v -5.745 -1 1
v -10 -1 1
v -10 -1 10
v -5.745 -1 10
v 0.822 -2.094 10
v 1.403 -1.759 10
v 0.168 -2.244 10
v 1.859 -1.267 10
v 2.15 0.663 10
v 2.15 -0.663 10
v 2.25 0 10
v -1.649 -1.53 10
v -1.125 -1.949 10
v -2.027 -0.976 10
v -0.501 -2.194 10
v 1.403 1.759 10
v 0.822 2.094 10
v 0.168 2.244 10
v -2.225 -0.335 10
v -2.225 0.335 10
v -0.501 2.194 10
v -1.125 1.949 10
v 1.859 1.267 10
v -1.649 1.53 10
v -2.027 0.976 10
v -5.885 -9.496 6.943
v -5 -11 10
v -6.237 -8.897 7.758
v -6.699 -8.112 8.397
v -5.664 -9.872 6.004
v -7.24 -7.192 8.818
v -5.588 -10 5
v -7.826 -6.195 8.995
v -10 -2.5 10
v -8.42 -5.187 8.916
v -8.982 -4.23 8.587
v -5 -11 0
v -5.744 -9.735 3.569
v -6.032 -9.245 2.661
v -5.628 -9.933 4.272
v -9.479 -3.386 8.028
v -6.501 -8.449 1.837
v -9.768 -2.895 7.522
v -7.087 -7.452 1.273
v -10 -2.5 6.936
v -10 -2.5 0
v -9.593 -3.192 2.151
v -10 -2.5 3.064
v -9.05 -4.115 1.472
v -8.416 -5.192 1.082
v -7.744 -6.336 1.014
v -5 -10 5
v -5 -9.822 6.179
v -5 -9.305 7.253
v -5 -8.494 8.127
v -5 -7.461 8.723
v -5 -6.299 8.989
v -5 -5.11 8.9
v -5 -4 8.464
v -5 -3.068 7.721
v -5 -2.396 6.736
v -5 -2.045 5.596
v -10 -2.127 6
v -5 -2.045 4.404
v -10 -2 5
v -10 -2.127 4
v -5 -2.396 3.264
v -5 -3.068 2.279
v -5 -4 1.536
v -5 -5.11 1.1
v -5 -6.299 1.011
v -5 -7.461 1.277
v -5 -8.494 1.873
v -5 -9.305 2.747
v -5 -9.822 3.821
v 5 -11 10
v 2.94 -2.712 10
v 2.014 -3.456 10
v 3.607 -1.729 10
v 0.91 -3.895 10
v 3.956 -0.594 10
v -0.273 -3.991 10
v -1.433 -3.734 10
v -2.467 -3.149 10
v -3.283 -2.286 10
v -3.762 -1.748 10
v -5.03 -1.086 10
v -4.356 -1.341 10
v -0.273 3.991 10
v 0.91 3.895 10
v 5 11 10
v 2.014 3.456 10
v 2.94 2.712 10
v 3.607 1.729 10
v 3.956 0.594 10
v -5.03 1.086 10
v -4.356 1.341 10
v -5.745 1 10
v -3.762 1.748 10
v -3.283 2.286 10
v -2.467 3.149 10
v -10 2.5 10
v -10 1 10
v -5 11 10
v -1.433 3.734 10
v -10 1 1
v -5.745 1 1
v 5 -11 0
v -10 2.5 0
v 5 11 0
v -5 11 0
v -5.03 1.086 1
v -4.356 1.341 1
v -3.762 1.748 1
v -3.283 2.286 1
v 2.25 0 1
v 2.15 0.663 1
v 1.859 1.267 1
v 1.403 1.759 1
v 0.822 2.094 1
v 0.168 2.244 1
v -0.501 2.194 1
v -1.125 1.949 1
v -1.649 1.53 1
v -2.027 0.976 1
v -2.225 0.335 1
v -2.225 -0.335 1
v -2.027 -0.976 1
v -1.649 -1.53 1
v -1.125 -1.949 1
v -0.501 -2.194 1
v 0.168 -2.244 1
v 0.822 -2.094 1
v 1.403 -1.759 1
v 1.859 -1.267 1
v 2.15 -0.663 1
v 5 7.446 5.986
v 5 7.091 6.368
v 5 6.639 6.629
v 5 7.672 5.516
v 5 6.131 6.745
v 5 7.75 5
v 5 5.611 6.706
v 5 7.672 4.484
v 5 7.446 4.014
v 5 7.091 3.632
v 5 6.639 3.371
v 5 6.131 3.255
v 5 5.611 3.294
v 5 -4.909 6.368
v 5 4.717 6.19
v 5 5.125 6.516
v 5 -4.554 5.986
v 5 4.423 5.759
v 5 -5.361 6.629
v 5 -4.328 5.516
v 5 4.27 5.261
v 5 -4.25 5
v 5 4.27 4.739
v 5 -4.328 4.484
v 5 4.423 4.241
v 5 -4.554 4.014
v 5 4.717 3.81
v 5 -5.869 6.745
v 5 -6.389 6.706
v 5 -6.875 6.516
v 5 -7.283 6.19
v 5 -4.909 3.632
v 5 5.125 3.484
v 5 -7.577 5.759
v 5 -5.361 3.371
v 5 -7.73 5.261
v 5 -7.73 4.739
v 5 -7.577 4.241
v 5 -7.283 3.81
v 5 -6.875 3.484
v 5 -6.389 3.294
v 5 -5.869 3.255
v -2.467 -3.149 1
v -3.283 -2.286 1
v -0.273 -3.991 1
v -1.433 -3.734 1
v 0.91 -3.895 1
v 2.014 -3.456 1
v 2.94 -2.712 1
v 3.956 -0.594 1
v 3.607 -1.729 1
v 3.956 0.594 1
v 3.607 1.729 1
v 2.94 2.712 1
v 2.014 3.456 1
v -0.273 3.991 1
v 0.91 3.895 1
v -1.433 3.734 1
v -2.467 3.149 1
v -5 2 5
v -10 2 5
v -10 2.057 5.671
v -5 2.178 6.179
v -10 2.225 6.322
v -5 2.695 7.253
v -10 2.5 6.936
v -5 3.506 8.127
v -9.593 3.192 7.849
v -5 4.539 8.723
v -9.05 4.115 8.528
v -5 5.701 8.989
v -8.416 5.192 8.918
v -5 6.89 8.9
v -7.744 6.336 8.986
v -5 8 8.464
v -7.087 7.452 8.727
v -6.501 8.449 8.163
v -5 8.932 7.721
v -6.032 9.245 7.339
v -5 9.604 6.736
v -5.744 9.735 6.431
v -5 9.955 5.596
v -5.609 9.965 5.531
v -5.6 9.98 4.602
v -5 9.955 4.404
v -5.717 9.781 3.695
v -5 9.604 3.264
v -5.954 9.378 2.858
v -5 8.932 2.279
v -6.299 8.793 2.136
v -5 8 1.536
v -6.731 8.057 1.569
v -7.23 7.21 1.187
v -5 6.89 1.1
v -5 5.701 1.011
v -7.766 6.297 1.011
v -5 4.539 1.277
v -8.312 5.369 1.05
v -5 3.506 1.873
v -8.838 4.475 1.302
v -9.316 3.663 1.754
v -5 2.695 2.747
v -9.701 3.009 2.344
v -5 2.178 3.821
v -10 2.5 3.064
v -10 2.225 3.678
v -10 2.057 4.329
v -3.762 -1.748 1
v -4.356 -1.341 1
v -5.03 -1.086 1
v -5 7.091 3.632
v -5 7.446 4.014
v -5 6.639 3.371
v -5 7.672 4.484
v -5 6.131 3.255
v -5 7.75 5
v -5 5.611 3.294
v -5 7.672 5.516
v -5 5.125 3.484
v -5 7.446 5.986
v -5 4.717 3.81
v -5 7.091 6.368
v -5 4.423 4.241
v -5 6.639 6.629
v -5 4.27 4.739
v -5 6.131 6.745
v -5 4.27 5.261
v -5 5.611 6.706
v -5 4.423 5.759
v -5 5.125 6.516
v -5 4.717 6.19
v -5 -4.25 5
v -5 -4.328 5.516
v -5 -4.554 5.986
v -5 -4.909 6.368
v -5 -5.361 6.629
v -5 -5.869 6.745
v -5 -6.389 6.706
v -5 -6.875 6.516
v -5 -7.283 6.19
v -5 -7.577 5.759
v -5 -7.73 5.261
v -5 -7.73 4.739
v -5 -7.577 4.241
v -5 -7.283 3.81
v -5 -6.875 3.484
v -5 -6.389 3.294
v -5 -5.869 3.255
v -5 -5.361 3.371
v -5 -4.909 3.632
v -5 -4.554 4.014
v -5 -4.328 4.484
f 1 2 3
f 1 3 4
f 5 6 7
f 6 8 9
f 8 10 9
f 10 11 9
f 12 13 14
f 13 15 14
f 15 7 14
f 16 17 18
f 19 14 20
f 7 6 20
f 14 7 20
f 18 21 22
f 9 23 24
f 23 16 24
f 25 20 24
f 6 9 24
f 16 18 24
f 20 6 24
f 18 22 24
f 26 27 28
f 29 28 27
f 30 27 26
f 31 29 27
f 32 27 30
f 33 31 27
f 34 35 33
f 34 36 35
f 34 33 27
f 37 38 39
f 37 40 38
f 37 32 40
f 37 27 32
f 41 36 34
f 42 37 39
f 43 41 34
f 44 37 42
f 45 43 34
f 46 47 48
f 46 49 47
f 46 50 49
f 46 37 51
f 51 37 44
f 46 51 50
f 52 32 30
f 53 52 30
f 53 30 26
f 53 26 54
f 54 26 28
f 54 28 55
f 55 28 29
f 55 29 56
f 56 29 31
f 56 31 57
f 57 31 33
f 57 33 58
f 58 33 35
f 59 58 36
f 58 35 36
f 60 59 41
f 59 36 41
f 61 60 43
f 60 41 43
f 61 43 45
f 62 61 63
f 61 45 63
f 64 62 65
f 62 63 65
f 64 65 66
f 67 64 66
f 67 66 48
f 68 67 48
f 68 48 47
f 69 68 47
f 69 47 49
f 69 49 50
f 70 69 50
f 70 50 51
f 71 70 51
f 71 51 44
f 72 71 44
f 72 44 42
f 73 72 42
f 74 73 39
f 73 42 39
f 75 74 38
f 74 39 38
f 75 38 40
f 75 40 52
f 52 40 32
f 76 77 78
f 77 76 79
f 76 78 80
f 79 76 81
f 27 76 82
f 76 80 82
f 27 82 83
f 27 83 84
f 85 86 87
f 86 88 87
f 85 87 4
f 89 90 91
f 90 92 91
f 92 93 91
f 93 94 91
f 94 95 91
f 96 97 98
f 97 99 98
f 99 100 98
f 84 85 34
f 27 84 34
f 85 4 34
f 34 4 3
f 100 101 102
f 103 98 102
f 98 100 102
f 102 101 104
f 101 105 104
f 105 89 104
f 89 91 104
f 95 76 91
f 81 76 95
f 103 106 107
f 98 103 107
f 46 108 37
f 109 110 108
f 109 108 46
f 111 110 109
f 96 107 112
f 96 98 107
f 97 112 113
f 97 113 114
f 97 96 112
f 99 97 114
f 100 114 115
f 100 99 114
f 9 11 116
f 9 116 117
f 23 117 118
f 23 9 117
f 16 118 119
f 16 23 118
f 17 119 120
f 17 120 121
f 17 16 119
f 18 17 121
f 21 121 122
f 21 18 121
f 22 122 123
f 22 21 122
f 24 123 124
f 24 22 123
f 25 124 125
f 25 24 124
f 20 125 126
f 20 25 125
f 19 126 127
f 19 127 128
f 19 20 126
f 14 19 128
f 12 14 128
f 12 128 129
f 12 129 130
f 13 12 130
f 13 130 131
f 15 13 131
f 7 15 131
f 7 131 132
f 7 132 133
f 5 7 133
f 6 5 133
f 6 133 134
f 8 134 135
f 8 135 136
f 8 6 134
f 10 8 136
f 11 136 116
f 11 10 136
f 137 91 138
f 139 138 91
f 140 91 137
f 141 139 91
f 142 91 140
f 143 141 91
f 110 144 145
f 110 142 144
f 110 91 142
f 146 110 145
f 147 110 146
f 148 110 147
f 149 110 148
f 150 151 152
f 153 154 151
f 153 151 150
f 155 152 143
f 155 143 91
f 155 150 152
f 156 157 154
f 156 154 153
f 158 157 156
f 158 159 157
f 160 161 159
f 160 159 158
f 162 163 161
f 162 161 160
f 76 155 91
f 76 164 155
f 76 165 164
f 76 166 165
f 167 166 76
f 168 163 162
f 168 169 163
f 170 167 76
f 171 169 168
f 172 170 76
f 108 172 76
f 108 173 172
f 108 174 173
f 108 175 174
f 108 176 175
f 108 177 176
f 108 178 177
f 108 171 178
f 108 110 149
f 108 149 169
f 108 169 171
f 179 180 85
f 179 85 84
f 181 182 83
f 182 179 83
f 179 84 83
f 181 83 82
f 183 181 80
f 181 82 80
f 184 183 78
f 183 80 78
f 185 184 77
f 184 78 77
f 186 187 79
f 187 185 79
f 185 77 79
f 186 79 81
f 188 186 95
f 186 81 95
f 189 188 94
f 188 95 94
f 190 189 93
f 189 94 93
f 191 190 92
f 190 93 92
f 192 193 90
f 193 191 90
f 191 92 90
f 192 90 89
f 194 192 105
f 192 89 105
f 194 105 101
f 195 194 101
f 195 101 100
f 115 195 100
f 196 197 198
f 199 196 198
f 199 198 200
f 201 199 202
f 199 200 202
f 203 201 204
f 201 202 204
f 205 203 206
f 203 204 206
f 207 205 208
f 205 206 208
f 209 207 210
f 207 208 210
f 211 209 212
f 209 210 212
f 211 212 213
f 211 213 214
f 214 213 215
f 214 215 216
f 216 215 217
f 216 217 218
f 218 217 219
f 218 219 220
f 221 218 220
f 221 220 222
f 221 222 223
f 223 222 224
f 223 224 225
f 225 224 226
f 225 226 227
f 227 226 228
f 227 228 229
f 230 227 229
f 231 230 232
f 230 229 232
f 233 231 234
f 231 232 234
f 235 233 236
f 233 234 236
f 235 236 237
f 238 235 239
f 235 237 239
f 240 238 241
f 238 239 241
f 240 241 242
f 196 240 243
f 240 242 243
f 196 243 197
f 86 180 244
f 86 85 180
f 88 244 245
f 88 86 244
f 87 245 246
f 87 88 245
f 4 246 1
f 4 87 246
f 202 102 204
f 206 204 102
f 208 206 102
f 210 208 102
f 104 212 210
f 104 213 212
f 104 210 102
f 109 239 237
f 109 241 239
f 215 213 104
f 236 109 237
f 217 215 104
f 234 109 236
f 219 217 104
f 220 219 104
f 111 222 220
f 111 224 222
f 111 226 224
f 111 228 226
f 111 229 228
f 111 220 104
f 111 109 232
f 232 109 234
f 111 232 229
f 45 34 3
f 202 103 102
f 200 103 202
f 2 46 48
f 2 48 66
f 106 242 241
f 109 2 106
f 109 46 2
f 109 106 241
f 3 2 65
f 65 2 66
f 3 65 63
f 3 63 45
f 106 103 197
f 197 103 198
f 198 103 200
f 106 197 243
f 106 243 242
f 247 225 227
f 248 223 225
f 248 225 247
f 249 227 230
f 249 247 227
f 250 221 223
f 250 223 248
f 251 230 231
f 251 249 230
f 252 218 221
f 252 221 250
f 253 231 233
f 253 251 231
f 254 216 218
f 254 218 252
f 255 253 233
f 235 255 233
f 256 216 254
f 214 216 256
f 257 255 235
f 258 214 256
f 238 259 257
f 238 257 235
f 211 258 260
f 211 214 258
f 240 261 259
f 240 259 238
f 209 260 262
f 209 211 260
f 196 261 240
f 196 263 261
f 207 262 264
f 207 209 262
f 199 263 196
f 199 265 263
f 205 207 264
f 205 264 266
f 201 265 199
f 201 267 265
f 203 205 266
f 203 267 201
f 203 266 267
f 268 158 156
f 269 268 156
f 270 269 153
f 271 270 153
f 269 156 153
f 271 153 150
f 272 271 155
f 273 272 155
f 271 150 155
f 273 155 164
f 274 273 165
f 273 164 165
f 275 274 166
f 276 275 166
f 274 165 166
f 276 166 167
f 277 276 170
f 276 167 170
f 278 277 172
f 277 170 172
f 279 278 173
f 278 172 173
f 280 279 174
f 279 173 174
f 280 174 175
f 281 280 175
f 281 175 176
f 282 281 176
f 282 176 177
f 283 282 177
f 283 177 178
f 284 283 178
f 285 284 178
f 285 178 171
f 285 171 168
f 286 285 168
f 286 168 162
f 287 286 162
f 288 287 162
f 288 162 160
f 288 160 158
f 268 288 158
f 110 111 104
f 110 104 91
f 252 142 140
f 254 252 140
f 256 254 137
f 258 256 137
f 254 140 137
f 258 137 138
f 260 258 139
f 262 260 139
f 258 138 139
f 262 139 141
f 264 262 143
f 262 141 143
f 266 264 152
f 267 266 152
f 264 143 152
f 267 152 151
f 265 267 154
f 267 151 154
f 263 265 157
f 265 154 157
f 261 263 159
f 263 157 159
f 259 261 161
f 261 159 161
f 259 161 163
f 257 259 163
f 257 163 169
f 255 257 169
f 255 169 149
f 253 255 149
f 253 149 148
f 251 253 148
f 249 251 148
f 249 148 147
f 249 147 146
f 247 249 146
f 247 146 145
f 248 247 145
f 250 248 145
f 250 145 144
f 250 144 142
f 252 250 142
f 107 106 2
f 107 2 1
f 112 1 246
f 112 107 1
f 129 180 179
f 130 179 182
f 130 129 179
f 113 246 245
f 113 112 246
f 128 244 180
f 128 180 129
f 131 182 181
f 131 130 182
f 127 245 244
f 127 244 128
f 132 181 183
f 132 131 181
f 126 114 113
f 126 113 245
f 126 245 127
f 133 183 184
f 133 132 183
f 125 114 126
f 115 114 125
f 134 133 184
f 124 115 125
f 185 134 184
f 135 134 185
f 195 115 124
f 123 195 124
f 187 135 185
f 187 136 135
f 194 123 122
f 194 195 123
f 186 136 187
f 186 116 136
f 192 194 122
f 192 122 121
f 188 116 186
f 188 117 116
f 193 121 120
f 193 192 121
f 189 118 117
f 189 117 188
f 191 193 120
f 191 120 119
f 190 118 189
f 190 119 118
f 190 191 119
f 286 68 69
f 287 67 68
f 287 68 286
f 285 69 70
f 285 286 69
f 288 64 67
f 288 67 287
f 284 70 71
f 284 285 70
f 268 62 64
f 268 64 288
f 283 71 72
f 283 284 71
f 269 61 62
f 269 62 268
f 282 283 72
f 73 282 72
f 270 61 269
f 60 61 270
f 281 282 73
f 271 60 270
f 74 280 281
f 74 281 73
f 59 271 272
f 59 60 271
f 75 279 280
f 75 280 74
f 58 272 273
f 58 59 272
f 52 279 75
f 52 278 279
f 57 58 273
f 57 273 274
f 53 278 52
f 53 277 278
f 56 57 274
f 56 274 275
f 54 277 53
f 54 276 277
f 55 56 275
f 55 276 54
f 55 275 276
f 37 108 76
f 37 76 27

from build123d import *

# Parameters (mm, degrees)
PAD_DEPTH       = 10
SKETCH001_R     = 1.75
POCKET_DEPTH    = 15.001
SKETCH002_R     = 4
POCKET001_DEPTH = 5
SKETCH005_R     = 4
SKETCH005_R_2   = 2.25
POCKET002_DEPTH = 9
SKETCH006_W     = 6.5
SKETCH006_H     = 2
POCKET003_DEPTH = 9
FILLET_R        = 3
FILLET001_R     = 3


with BuildPart() as part:
    # Sketch → Pad (new body)
    with BuildSketch(Plane.XY):
        Polygon((-5, 11), (5, 11), (5, -11), (-5, -11), (-10, -2.5), (-10, 2.5), align=None)
    extrude(amount=PAD_DEPTH)

    # Sketch001 → Pocket (cut, through all)
    with BuildSketch(Plane.YZ.offset(5)):
        with Locations((-6, 5)):
            Circle(SKETCH001_R)
        with Locations((6, 5)):
            Circle(SKETCH001_R)
    extrude(amount=-POCKET_DEPTH, mode=Mode.SUBTRACT)

    # Sketch002 → Pocket001 (cut)
    with BuildSketch(Plane(origin=(-10, 0, 0), x_dir=(0, -1, 0), z_dir=(-1, 0, 0))):
        with Locations((-6, 5)):
            Circle(SKETCH002_R)
        with Locations((6, 5)):
            Circle(SKETCH002_R)
    extrude(amount=-POCKET001_DEPTH, mode=Mode.SUBTRACT)

    # Sketch005 → Pocket002 (cut)
    with BuildSketch(Plane.XY.offset(10)):
        Circle(SKETCH005_R)
        Circle(SKETCH005_R_2, mode=Mode.SUBTRACT)
    extrude(amount=-POCKET002_DEPTH, mode=Mode.SUBTRACT)

    # Sketch006 → Pocket003 (cut)
    with BuildSketch(Plane.XY.offset(10)):
        with Locations((-6.75, 0)):
            Rectangle(SKETCH006_W, SKETCH006_H)
    extrude(amount=-POCKET003_DEPTH, mode=Mode.SUBTRACT)

    # Fillet
    fillet_edges = [part.edges().sort_by_distance(p)[0] for p in [
        (-3.872983, 1, 5.5),
    ]]
    fillet(fillet_edges, radius=FILLET_R)

    # Fillet001
    fillet001_edges = [part.edges().sort_by_distance(p)[0] for p in [
        (-3.872983, -1, 5.5),
    ]]
    fillet(fillet001_edges, radius=FILLET001_R)


solid = part.part
